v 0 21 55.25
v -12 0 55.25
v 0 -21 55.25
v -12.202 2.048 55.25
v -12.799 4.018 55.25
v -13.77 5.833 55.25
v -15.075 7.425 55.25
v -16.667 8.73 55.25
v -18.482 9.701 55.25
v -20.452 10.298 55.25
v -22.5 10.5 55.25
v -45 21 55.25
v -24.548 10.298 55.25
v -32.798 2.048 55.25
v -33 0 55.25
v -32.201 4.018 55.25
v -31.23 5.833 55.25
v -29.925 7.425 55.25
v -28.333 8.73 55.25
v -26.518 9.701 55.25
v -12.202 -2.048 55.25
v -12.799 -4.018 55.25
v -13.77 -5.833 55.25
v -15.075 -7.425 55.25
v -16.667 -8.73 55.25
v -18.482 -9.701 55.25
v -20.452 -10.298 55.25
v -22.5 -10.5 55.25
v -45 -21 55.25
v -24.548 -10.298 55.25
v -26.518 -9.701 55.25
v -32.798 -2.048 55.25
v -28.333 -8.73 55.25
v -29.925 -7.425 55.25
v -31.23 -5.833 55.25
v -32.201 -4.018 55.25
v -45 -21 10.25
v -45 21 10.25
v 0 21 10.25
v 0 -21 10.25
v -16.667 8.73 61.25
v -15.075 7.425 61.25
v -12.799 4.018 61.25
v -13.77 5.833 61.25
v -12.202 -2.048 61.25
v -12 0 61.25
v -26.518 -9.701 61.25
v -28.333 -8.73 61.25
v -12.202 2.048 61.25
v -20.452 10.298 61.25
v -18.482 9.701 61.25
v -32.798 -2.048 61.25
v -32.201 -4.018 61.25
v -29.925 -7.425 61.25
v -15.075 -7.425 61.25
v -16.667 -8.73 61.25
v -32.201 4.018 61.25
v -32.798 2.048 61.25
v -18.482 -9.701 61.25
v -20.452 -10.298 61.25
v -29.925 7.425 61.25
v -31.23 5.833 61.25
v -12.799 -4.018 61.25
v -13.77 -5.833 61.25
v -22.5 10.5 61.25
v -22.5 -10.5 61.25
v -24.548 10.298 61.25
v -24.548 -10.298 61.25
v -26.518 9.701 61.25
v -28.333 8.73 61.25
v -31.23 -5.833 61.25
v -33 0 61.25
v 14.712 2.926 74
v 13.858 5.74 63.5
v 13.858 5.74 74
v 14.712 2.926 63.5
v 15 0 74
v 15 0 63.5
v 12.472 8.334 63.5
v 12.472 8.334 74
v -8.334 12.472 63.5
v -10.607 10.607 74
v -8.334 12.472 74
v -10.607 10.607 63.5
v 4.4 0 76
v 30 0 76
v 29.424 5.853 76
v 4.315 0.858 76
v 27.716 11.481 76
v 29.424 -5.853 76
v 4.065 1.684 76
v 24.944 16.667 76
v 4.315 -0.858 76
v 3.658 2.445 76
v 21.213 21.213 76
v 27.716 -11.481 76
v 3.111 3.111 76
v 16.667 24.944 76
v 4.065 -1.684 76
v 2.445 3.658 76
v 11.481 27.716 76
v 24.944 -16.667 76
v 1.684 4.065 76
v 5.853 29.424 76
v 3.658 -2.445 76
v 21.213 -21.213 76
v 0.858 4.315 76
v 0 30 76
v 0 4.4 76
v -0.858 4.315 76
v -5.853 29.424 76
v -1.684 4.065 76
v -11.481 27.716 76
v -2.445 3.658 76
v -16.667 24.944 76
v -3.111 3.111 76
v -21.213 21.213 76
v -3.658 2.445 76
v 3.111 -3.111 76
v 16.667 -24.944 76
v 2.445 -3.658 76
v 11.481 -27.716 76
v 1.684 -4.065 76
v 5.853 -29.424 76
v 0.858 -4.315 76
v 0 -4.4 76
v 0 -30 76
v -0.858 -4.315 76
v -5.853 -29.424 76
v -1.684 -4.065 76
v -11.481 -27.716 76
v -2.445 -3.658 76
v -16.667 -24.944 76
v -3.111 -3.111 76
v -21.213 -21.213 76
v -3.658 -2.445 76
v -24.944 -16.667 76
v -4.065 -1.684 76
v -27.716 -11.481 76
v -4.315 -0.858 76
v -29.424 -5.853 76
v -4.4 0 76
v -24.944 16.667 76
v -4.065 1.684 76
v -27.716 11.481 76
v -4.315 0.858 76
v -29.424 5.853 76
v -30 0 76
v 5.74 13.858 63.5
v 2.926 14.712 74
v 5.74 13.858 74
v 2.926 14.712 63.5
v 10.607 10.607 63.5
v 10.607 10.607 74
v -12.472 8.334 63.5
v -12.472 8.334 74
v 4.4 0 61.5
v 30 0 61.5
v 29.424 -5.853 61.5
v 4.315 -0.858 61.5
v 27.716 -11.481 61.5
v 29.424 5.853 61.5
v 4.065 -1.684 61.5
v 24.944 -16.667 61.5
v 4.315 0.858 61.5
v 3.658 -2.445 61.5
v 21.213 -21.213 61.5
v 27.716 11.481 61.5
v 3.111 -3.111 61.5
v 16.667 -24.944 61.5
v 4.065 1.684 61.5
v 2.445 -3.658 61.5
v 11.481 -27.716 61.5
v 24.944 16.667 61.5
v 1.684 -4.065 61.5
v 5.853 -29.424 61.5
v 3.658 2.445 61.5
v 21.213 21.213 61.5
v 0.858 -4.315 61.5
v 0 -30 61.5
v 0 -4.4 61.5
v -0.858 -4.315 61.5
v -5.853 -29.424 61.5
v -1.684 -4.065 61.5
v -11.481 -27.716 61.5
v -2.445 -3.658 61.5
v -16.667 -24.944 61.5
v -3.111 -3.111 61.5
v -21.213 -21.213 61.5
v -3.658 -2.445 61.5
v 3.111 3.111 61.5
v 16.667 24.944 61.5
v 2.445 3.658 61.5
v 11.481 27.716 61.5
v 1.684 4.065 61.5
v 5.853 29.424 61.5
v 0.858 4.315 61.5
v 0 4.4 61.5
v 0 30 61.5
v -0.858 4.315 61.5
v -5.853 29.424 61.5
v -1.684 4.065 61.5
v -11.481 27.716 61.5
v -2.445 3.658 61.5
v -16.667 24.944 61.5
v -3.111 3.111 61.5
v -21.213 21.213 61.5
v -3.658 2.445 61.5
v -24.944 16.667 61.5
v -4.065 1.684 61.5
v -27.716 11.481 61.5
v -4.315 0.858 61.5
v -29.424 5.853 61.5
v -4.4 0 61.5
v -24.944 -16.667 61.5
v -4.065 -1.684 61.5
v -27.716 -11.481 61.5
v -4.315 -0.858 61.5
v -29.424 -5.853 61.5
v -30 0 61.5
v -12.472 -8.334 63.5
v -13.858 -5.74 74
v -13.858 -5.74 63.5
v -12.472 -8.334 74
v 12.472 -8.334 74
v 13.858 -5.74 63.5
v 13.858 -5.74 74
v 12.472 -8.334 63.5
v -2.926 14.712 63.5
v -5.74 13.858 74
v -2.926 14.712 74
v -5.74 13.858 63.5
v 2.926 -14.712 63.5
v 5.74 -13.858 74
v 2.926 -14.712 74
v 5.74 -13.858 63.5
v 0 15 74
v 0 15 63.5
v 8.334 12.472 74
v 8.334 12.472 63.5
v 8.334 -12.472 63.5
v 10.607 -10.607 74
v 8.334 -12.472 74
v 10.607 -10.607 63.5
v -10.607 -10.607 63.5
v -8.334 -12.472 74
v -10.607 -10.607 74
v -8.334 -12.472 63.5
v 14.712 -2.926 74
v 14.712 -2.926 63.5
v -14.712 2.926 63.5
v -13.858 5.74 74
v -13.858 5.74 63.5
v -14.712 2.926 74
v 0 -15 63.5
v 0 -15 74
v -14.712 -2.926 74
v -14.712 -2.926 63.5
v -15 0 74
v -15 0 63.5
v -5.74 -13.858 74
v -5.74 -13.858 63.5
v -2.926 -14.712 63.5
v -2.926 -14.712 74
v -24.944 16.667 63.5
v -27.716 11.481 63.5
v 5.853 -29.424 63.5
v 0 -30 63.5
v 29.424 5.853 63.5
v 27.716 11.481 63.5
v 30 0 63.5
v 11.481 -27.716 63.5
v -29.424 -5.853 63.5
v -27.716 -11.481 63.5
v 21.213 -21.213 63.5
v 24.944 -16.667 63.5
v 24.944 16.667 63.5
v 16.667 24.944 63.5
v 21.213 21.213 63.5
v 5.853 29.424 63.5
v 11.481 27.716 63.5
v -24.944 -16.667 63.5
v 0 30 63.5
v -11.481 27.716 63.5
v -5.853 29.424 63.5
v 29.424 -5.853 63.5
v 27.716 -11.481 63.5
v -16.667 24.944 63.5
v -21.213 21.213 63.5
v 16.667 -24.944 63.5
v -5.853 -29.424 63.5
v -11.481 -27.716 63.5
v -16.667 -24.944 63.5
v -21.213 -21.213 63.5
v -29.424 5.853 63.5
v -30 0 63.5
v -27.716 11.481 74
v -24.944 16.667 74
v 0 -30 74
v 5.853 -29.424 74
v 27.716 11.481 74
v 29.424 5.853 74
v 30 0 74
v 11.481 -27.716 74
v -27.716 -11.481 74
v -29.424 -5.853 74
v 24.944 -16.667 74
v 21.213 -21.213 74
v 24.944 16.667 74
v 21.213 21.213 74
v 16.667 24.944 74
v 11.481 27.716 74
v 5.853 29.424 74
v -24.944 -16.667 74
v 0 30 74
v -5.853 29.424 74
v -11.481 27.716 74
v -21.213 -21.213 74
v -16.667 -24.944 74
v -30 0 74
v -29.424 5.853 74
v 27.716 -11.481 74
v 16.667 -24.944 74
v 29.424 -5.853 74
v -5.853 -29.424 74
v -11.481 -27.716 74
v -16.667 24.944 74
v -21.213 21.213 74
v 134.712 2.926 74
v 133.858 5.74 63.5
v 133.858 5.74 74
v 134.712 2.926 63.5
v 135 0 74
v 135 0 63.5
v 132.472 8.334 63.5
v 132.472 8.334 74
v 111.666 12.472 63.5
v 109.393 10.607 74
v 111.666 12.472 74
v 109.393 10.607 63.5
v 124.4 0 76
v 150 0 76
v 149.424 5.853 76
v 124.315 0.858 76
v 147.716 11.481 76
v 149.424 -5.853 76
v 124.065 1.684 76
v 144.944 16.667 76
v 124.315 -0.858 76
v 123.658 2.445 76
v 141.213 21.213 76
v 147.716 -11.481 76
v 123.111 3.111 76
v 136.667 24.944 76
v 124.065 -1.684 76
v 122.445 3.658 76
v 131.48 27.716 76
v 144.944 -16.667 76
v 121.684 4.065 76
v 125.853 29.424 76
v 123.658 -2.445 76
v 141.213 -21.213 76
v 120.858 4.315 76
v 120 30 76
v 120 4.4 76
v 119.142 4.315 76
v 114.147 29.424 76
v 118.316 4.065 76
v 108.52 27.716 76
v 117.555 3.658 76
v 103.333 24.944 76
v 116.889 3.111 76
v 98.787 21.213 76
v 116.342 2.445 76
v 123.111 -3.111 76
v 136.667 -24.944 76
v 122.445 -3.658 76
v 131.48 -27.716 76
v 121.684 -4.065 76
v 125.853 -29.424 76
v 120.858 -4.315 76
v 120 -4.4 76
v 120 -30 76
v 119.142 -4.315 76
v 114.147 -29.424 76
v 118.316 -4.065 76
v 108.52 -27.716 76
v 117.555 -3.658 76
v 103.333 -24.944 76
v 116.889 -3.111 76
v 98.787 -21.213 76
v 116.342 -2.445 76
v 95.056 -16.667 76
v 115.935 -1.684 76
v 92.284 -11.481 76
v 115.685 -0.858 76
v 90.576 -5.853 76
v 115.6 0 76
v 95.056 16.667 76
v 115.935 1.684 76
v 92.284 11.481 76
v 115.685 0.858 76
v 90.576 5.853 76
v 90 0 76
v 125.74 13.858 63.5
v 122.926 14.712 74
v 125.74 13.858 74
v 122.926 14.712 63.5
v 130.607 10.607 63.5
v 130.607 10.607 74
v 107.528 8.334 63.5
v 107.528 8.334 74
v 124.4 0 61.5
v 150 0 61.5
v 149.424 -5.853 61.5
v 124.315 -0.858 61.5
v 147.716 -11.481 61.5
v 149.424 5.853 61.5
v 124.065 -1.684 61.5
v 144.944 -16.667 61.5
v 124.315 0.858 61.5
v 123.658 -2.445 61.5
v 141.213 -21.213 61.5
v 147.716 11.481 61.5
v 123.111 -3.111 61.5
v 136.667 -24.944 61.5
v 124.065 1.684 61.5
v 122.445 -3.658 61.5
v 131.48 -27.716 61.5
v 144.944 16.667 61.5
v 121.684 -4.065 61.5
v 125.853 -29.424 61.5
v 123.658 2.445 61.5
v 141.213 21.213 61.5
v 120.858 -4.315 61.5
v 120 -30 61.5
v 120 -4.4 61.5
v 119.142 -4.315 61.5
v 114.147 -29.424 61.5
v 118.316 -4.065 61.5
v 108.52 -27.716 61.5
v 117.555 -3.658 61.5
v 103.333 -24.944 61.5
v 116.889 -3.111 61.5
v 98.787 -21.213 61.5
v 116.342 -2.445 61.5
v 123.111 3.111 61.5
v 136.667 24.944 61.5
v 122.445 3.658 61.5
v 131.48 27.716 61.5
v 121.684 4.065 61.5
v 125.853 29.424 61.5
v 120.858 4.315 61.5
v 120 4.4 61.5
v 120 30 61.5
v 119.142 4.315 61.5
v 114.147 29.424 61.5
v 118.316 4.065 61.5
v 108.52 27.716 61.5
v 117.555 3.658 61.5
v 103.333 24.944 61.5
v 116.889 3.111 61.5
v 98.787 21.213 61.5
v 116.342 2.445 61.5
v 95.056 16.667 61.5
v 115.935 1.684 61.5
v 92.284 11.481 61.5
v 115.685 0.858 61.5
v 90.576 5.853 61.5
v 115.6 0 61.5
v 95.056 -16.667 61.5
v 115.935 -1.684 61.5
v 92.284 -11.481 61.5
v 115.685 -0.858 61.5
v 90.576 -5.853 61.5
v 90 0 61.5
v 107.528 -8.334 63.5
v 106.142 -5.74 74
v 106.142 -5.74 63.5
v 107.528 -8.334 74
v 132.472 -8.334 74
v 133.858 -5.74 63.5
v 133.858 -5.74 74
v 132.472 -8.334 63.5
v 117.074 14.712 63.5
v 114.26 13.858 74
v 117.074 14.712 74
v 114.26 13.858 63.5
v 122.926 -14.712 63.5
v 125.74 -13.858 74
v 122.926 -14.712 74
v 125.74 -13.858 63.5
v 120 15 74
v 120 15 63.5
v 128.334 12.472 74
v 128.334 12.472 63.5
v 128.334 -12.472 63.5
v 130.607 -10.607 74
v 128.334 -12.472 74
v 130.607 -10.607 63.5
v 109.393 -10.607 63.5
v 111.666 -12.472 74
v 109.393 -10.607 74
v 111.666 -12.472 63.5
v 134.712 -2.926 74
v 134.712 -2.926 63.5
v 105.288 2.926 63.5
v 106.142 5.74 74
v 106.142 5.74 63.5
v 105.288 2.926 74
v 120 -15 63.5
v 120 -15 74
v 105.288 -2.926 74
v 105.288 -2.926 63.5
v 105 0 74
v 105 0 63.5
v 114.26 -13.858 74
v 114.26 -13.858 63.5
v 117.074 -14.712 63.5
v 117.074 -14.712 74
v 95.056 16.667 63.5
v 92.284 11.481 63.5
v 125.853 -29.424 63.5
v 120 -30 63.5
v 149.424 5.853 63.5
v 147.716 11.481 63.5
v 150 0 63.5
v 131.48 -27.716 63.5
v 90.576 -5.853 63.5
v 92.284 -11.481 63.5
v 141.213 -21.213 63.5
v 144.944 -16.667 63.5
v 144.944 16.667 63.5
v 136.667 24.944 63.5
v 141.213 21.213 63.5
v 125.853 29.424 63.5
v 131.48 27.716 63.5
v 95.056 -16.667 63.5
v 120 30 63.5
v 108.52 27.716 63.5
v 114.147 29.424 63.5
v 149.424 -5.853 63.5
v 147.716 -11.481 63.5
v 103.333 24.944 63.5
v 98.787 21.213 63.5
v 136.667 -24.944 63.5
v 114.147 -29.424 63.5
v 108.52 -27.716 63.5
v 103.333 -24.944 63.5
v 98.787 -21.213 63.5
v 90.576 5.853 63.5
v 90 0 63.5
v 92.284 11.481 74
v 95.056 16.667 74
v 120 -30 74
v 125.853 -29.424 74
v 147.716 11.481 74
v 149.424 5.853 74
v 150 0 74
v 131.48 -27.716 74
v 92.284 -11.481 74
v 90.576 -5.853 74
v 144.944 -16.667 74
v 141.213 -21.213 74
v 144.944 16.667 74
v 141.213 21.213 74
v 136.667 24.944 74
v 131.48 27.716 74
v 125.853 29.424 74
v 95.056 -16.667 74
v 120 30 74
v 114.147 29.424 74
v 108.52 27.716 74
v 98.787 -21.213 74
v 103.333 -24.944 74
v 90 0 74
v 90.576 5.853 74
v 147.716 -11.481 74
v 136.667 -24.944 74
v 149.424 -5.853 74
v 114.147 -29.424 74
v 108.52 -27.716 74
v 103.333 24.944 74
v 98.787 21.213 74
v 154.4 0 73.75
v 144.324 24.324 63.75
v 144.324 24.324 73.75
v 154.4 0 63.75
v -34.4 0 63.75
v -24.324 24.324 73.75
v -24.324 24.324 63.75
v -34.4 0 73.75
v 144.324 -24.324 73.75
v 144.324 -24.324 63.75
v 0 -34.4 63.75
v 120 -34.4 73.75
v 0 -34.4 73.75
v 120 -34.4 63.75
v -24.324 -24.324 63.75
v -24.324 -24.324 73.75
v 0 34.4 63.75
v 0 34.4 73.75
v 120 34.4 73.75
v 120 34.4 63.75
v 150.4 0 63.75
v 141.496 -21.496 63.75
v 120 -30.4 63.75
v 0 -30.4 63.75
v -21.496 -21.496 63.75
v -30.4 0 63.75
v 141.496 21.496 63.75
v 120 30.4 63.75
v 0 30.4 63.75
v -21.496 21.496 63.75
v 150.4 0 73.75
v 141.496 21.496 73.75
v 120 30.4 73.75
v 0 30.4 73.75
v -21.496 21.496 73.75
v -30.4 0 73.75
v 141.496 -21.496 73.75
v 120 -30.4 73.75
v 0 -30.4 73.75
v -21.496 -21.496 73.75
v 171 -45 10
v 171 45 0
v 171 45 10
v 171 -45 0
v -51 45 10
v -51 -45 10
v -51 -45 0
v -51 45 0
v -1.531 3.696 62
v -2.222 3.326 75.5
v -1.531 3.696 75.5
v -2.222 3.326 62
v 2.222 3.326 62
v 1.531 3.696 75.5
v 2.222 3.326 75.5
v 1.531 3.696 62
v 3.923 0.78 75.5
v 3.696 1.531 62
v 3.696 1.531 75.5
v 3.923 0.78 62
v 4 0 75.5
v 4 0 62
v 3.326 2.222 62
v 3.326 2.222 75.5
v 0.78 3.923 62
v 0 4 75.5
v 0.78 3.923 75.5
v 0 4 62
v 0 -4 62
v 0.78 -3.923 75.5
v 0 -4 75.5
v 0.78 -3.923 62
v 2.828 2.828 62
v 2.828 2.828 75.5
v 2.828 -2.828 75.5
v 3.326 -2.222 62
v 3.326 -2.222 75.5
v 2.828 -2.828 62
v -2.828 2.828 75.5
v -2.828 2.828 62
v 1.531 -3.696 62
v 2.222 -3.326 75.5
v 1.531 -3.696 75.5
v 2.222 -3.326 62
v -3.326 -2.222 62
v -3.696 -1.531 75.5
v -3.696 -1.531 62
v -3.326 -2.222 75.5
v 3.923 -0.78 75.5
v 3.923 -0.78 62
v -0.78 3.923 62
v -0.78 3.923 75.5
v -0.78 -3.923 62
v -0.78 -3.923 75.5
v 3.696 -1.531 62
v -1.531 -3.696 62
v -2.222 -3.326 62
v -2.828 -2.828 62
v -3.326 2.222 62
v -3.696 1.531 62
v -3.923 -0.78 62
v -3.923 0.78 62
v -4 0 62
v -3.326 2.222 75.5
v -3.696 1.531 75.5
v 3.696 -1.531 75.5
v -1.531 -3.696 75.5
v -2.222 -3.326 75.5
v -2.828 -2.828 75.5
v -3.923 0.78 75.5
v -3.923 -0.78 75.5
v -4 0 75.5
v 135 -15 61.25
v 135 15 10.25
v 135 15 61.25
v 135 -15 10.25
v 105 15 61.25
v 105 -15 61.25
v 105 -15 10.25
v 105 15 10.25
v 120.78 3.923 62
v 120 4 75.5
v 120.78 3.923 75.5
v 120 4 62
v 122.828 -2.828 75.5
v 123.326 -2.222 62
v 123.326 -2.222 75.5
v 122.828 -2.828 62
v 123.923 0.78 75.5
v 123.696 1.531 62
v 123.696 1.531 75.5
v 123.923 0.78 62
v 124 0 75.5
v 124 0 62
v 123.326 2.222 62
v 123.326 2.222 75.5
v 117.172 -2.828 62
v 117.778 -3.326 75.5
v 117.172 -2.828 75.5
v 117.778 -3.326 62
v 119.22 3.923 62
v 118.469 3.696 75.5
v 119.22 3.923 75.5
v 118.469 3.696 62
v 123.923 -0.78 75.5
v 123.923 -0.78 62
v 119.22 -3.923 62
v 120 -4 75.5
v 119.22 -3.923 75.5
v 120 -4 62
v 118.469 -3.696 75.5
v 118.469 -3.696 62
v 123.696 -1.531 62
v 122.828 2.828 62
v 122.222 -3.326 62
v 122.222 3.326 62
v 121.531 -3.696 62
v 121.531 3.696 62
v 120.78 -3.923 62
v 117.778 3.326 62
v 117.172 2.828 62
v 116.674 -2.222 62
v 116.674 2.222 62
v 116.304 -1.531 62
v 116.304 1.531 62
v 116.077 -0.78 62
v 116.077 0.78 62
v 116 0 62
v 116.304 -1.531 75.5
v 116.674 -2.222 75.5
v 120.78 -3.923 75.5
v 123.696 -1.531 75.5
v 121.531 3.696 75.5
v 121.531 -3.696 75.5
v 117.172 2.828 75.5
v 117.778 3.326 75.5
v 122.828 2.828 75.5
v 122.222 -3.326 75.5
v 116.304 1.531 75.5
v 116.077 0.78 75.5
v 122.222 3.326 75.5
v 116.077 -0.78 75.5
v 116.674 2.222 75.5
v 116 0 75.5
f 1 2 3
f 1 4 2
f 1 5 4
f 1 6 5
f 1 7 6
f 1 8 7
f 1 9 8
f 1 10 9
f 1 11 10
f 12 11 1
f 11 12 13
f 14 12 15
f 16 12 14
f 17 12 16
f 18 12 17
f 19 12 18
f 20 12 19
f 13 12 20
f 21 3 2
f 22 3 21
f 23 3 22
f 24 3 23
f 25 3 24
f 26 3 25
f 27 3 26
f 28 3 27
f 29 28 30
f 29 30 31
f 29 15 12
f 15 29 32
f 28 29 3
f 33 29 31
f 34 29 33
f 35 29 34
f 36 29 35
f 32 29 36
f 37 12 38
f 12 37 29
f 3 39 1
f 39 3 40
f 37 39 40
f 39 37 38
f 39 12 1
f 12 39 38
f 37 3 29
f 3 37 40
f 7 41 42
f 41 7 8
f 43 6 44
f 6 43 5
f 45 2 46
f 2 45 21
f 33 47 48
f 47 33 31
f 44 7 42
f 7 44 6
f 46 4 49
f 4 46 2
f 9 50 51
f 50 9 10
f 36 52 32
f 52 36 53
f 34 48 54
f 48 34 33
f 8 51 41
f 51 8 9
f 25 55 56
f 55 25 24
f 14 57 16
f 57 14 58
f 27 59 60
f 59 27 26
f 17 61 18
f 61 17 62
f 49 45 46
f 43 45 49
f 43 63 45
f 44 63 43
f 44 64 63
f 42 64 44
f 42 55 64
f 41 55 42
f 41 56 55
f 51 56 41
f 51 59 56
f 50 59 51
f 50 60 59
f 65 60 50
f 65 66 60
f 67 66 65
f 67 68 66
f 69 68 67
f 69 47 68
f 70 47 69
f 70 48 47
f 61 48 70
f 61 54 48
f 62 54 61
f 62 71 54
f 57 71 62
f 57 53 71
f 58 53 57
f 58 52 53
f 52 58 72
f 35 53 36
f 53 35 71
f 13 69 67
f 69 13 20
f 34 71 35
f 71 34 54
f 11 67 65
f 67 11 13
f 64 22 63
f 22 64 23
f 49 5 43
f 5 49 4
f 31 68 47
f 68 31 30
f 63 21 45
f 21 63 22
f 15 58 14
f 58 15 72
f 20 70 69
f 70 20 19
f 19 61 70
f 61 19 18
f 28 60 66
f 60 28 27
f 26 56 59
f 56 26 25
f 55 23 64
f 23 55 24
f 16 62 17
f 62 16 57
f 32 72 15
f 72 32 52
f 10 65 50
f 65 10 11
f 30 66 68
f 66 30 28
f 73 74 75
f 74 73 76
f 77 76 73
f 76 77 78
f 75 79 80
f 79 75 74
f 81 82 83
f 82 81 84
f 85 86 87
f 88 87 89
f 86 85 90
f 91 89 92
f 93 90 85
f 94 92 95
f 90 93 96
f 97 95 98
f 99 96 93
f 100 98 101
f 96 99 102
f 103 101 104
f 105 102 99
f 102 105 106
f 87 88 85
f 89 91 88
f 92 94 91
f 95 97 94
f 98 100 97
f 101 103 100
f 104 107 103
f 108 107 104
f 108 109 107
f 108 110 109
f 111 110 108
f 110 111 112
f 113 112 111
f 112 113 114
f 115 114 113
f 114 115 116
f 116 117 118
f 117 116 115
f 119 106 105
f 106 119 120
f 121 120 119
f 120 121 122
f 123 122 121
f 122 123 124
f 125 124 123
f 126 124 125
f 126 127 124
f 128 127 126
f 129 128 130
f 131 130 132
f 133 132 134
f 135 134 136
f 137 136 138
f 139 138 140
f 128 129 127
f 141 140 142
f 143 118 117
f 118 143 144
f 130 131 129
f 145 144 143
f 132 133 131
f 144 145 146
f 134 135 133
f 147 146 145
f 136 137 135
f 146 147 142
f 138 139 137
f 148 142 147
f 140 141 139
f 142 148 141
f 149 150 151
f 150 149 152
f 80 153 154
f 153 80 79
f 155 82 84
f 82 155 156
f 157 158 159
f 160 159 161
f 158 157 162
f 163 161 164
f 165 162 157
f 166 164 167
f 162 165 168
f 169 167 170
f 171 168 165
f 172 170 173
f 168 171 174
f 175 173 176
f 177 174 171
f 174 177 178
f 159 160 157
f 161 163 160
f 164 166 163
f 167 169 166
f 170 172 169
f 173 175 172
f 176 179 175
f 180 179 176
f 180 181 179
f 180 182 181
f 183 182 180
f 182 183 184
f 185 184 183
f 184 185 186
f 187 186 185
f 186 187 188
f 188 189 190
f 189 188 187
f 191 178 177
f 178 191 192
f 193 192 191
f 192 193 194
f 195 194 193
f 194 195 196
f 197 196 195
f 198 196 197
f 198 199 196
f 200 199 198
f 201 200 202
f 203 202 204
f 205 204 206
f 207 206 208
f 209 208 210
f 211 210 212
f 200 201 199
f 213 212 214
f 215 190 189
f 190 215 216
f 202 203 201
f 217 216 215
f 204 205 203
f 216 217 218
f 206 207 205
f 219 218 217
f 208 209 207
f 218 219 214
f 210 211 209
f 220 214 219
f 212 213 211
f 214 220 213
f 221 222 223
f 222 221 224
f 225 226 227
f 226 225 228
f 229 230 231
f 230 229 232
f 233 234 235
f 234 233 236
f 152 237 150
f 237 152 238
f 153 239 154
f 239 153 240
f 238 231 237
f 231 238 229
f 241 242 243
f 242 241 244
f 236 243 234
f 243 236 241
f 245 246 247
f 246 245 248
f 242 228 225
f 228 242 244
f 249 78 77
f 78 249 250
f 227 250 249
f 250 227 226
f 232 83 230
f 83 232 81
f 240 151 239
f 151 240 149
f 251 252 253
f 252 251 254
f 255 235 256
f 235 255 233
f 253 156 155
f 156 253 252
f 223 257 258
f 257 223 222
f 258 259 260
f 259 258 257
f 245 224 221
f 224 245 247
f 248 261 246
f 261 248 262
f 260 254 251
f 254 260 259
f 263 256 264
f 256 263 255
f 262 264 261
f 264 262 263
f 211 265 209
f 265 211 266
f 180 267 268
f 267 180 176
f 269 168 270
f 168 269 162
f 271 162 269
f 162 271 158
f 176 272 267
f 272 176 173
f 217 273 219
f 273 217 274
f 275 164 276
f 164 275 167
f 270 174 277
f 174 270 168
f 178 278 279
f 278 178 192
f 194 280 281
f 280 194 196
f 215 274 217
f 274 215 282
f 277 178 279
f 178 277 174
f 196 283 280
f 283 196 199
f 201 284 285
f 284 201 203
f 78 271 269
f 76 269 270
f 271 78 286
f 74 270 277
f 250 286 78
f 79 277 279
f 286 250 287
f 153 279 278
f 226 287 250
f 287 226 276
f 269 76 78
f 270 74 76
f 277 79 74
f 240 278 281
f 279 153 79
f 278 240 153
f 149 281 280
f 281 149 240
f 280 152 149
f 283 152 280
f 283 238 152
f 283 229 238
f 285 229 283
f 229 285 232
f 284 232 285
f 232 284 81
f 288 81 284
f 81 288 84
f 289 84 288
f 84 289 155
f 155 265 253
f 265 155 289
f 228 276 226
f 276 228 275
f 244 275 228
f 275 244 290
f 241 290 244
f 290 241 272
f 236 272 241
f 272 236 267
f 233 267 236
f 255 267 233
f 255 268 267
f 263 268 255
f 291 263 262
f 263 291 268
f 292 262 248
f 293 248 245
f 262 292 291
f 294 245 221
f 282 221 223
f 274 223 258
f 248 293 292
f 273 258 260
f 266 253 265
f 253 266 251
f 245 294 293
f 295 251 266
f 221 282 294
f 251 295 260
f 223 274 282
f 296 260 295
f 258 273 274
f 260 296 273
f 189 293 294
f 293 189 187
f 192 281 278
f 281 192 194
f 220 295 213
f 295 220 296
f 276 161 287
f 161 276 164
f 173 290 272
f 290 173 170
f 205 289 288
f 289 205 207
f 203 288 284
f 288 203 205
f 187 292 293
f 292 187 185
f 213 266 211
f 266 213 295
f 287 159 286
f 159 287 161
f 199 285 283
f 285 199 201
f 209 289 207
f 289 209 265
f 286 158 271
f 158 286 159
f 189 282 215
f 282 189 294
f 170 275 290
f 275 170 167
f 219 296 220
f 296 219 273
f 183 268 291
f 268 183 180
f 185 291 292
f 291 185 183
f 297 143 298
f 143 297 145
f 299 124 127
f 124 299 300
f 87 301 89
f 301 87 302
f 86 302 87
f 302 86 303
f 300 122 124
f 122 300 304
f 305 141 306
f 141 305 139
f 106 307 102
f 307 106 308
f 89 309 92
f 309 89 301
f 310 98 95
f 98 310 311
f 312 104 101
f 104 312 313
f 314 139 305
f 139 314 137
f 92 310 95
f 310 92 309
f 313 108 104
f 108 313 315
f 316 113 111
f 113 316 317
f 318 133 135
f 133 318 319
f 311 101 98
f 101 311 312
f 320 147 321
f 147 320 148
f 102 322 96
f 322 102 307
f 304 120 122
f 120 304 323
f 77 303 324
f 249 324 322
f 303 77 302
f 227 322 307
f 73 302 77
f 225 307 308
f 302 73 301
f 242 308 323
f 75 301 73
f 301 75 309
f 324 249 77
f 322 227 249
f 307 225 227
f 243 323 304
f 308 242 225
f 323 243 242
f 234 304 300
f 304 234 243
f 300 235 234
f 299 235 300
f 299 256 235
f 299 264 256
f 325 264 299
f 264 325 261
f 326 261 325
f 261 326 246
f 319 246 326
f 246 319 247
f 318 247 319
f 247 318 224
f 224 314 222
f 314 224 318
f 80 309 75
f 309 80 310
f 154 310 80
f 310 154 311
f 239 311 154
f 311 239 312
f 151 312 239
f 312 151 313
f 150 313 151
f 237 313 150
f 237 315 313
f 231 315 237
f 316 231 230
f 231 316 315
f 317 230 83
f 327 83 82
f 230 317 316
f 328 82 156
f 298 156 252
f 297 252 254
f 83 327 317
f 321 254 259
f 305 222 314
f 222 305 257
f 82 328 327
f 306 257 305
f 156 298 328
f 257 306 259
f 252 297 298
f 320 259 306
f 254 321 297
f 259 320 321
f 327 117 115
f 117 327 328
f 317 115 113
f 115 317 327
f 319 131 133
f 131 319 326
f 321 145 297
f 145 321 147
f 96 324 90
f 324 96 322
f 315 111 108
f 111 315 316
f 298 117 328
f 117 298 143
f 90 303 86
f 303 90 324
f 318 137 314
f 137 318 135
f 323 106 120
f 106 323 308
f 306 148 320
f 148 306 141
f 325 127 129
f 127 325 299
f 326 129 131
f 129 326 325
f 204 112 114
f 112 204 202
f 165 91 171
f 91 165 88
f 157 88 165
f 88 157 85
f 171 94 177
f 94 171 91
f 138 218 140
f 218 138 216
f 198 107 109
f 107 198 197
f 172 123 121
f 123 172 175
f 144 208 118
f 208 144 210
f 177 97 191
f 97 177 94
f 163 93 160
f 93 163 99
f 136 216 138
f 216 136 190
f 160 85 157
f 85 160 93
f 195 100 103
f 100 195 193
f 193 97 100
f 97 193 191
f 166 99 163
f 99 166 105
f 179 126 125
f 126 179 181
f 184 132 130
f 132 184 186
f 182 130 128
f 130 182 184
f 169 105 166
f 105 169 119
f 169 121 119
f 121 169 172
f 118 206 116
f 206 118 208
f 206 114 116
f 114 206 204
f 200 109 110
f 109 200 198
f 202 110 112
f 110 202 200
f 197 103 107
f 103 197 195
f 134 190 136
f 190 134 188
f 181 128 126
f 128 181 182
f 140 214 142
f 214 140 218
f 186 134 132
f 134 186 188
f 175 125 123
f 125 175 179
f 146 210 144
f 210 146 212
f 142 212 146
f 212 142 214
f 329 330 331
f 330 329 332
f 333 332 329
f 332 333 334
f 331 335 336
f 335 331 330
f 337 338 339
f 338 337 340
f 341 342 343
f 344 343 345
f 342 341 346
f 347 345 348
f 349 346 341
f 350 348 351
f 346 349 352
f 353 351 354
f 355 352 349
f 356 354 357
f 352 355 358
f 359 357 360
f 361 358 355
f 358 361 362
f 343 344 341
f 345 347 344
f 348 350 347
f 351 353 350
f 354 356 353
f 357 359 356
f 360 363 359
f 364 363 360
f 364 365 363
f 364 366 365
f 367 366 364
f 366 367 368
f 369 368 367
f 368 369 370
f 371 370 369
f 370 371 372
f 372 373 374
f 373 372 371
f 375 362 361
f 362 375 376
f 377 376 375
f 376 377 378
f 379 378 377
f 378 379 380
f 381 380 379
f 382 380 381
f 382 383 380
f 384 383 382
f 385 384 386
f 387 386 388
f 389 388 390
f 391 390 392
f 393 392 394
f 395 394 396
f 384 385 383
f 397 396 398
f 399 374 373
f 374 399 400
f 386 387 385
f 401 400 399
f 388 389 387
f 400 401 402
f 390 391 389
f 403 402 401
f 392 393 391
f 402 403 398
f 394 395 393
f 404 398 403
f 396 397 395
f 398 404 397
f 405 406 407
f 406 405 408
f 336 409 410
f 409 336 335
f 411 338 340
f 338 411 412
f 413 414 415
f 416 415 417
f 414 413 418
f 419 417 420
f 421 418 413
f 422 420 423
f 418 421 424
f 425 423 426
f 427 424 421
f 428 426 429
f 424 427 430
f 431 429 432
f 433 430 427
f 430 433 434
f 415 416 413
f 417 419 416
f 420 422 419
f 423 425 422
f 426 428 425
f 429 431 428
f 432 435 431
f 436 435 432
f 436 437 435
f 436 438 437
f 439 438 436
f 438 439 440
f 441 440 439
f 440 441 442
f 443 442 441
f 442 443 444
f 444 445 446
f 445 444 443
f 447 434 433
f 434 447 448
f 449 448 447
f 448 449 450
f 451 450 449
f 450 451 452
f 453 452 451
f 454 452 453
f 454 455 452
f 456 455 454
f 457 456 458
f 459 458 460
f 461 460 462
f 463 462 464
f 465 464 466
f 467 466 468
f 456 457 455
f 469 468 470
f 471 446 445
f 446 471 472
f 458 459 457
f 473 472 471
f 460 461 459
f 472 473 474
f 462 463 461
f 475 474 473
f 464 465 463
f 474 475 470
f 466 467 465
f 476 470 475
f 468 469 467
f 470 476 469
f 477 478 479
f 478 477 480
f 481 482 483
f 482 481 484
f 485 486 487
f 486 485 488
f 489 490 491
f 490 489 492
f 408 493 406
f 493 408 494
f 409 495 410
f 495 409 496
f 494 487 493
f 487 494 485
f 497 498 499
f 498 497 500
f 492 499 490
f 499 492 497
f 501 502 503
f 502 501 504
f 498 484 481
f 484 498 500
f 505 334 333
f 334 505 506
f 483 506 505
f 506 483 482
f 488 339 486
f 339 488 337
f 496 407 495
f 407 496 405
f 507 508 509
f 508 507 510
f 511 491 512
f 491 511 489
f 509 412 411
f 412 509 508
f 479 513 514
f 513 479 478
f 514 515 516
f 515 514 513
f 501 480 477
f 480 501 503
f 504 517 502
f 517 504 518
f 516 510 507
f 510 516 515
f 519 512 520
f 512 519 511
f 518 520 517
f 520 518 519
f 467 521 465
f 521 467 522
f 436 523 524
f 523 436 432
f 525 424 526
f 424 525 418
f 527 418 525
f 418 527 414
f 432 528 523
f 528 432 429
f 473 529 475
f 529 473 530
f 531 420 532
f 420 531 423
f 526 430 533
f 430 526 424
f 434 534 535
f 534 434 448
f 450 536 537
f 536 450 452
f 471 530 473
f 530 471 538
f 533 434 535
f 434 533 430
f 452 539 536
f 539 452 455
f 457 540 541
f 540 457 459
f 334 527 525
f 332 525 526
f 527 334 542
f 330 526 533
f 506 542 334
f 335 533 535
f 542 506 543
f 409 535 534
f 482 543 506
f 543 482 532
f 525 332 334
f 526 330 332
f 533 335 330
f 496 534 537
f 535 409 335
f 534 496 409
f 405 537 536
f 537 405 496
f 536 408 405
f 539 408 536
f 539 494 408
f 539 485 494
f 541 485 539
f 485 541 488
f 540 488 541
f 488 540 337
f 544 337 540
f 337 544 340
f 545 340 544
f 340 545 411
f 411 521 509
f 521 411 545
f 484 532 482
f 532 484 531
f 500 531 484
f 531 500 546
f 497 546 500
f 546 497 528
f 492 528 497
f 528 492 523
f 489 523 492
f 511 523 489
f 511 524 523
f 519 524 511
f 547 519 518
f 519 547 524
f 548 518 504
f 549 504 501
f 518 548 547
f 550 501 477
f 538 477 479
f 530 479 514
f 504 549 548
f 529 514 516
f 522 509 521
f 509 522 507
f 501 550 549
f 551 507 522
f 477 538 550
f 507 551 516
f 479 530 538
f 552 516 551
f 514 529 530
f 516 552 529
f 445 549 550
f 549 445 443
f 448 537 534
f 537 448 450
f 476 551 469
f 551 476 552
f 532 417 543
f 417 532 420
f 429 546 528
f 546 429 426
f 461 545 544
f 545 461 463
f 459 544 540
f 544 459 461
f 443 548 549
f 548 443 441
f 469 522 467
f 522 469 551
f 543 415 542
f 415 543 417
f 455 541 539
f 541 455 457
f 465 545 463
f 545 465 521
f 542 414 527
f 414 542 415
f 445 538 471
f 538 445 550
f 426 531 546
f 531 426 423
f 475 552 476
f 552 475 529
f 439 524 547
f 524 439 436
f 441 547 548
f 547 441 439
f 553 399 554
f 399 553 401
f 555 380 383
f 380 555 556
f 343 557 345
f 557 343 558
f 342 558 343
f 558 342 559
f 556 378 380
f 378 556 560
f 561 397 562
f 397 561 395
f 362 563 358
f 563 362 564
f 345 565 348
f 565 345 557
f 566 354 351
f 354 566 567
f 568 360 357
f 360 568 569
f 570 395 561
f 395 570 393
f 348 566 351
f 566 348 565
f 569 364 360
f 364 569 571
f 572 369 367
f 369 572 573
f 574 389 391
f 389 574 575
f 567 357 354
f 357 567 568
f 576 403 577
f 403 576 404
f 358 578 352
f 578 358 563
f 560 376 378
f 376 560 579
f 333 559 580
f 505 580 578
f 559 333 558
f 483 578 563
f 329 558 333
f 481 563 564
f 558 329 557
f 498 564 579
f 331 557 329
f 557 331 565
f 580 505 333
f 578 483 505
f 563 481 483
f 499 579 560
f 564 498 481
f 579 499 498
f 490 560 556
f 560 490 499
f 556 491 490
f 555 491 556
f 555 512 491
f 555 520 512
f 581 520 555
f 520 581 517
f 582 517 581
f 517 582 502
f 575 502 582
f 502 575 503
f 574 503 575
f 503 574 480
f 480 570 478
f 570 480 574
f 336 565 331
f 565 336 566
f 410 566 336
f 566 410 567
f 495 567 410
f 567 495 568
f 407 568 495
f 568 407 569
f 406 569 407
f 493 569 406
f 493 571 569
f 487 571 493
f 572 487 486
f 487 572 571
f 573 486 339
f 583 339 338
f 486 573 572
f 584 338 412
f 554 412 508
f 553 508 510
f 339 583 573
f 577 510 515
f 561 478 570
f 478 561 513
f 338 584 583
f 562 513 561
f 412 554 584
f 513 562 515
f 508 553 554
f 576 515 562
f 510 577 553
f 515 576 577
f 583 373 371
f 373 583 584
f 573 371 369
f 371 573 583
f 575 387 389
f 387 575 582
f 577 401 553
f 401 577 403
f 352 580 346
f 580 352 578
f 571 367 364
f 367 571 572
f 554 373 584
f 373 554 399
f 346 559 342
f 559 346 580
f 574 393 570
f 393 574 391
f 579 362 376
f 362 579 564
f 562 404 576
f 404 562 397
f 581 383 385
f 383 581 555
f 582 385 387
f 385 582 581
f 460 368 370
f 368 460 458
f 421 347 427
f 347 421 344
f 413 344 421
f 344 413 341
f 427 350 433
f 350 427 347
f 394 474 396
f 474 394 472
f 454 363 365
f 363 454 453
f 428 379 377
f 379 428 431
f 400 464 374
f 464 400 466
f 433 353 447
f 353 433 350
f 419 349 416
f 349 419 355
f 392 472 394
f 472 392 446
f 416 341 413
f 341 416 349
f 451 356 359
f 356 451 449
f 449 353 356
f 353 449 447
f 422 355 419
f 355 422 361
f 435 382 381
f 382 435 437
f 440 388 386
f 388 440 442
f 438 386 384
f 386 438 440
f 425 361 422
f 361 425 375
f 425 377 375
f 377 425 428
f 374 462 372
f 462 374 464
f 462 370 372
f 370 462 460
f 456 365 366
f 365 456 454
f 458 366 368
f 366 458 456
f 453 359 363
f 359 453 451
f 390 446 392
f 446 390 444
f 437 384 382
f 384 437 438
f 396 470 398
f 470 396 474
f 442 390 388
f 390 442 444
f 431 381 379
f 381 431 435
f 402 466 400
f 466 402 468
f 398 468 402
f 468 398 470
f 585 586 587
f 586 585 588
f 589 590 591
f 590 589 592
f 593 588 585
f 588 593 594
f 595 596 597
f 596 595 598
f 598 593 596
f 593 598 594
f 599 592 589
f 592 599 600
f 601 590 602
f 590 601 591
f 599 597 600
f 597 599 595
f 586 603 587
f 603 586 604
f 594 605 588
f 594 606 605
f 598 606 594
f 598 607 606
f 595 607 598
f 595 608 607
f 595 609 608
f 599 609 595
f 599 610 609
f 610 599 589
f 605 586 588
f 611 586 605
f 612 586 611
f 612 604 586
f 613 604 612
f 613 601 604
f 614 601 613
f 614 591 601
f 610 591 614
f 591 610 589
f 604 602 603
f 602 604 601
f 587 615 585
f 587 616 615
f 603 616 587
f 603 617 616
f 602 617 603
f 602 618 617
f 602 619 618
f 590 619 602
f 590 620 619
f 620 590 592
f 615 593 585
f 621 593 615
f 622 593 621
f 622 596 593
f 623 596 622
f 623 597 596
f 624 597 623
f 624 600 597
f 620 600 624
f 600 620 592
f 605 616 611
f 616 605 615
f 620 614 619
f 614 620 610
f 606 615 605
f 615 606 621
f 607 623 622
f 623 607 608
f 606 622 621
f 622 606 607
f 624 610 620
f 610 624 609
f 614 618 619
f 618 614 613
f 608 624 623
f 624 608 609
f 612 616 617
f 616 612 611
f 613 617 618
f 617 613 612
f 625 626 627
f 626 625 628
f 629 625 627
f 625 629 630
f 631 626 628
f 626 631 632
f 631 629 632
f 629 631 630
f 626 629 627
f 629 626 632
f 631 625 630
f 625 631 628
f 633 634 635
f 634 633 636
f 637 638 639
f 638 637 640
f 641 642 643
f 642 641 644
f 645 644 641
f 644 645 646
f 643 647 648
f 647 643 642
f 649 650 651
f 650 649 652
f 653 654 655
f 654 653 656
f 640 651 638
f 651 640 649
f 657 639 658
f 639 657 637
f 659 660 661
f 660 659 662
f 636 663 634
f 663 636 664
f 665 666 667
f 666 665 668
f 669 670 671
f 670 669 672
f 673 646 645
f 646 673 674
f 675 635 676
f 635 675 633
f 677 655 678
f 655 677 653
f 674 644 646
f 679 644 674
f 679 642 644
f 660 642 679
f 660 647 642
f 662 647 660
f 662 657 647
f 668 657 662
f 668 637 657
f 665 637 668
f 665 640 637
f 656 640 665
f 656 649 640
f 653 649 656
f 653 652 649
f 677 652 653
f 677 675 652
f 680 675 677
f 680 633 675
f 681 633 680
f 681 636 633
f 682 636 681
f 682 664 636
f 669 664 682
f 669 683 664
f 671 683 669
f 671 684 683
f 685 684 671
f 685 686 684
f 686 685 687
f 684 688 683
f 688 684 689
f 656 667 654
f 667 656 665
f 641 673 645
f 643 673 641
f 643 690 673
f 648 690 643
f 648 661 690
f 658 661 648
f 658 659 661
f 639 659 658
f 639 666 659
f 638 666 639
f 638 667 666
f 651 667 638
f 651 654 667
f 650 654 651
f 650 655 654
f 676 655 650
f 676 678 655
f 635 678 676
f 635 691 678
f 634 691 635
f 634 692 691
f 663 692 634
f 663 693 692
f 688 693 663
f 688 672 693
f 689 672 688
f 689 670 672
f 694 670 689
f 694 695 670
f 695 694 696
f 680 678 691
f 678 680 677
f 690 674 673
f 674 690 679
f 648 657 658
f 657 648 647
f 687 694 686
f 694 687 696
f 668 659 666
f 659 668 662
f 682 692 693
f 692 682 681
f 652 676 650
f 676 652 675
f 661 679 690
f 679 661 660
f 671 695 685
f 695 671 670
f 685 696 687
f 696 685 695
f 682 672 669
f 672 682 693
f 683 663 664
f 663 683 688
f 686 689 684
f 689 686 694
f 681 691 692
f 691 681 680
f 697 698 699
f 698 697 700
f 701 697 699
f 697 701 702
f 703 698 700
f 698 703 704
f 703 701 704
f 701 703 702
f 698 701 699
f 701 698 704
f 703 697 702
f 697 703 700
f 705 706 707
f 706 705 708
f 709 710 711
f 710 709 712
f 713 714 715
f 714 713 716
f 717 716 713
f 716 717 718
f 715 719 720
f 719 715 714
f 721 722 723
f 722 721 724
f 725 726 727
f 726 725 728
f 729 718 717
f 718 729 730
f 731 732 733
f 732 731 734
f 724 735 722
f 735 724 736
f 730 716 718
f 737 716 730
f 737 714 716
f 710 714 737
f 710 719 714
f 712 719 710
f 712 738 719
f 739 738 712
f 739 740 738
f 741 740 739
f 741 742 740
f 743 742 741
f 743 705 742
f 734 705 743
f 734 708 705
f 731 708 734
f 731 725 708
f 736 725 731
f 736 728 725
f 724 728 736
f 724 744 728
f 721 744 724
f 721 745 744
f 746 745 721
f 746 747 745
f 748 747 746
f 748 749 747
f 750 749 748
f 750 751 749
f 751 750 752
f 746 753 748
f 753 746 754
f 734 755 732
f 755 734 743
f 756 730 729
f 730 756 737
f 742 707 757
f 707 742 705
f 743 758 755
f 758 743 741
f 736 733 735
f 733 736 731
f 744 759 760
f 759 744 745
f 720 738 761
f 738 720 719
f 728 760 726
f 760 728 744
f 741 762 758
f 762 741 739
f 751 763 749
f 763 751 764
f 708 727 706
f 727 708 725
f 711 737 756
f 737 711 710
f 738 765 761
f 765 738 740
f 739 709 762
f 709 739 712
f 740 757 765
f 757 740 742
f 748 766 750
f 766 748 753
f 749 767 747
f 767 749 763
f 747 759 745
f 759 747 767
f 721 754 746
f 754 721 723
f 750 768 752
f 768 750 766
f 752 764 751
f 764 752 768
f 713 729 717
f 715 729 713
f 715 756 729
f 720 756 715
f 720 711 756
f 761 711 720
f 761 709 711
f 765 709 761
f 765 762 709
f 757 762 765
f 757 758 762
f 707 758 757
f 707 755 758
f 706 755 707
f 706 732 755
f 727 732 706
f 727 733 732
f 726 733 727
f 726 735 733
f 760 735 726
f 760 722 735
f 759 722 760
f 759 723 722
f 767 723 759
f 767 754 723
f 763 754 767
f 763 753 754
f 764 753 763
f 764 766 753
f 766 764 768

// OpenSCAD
$fn = 32;

// ------------------------------------------------------------------------
// Motor belt drive: span 120 mm, pulleys d60, belt 10 mm wide
// Every part is its own module, assembly() places every instance.
// ------------------------------------------------------------------------

// --- part 1 ---
module base_plate() {
  difference() {
    translate([-111, -45, 0]) cube([222, 90, 10]);
  }
}

// --- part 2 ---
module motor() {
  union() {
    translate([-22.5, -21, 0]) cube([45, 42, 45]);
    translate([25.5, 0, 22.5]) rotate([0, 90, 0]) cylinder(h = 6, d = 21, center = true);
  }
}

// --- part 3 ---
module drive_shaft() {
  translate([0, 0, -6.75]) cylinder(h = 13.5, d = 8);
}

// --- part 4 ---
module pulley_drive() {
  difference() {
    union() {
      cylinder(h = 14.5, d = 30);
      cylinder(h = 2, d = 60);
      translate([0, 0, 12.5]) cylinder(h = 2, d = 60);
    }
    translate([0, 0, -1]) cylinder(h = 16.5, d = 8.8);
  }
}

// --- part 5 ---
module idler_post() {
  translate([-15, -15, 0]) cube([30, 30, 51]);
}

// --- part 6 ---
module driven_shaft() {
  translate([0, 0, -6.75]) cylinder(h = 13.5, d = 8);
}

// --- part 7 ---
module pulley_driven() {
  difference() {
    union() {
      cylinder(h = 14.5, d = 30);
      cylinder(h = 2, d = 60);
      translate([0, 0, 12.5]) cylinder(h = 2, d = 60);
    }
    translate([0, 0, -1]) cylinder(h = 16.5, d = 8.8);
  }
}

// --- part 8 ---
module drive_belt() {
  difference() {
    linear_extrude(height = 10) polygon(points = concat([for (a = [90 : 45 : 270]) [34.4 * cos(a), 34.4 * sin(a)]], [for (a = [270 : 45 : 450]) [120 + 34.4 * cos(a), 34.4 * sin(a)]]));
    translate([0, 0, -1]) linear_extrude(height = 12) polygon(points = concat([for (a = [90 : 45 : 270]) [30.4 * cos(a), 30.4 * sin(a)]], [for (a = [270 : 45 : 450]) [120 + 30.4 * cos(a), 30.4 * sin(a)]]));
  }
}

// --- assembly ---
module assembly() {
  color([0.80, 0.24, 0.20]) translate([60, 0, 0]) rotate([0, 0, 0]) base_plate();
  color([0.20, 0.45, 0.75]) translate([0, 0, 32.75]) rotate([0, 270, 0]) motor();
  color([0.25, 0.62, 0.32]) translate([0, 0, 68.75]) rotate([0, 0, 0]) drive_shaft();
  color([0.92, 0.70, 0.18]) translate([0, 0, 61.5]) rotate([0, 0, 0]) pulley_drive();
  color([0.58, 0.35, 0.70]) translate([120, 0, 10.25]) rotate([0, 0, 0]) idler_post();
  color([0.16, 0.66, 0.66]) translate([120, 0, 68.75]) rotate([0, 0, 0]) driven_shaft();
  color([0.85, 0.48, 0.18]) translate([120, 0, 61.5]) rotate([0, 0, 0]) pulley_driven();
  color([0.55, 0.60, 0.65]) translate([0, 0, 63.75]) rotate([0, 0, 0]) drive_belt();
}

assembly();
